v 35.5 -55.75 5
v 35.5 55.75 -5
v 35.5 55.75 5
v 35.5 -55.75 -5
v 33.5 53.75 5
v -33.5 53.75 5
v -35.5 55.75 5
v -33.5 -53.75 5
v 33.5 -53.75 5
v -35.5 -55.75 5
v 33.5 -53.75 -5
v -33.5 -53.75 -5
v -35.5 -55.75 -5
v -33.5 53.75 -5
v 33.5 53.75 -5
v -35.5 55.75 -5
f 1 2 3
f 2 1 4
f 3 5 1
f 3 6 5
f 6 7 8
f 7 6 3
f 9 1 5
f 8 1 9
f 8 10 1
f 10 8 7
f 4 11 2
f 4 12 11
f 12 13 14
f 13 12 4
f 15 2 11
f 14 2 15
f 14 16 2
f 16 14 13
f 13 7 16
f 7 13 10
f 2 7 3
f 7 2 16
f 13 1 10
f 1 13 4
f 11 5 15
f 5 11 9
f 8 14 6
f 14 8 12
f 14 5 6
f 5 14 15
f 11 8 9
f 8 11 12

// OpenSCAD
difference(){
    cube([67.0+4,107.5+4,10],true);
    cube([67.0,107.5,10.1],true);
};
